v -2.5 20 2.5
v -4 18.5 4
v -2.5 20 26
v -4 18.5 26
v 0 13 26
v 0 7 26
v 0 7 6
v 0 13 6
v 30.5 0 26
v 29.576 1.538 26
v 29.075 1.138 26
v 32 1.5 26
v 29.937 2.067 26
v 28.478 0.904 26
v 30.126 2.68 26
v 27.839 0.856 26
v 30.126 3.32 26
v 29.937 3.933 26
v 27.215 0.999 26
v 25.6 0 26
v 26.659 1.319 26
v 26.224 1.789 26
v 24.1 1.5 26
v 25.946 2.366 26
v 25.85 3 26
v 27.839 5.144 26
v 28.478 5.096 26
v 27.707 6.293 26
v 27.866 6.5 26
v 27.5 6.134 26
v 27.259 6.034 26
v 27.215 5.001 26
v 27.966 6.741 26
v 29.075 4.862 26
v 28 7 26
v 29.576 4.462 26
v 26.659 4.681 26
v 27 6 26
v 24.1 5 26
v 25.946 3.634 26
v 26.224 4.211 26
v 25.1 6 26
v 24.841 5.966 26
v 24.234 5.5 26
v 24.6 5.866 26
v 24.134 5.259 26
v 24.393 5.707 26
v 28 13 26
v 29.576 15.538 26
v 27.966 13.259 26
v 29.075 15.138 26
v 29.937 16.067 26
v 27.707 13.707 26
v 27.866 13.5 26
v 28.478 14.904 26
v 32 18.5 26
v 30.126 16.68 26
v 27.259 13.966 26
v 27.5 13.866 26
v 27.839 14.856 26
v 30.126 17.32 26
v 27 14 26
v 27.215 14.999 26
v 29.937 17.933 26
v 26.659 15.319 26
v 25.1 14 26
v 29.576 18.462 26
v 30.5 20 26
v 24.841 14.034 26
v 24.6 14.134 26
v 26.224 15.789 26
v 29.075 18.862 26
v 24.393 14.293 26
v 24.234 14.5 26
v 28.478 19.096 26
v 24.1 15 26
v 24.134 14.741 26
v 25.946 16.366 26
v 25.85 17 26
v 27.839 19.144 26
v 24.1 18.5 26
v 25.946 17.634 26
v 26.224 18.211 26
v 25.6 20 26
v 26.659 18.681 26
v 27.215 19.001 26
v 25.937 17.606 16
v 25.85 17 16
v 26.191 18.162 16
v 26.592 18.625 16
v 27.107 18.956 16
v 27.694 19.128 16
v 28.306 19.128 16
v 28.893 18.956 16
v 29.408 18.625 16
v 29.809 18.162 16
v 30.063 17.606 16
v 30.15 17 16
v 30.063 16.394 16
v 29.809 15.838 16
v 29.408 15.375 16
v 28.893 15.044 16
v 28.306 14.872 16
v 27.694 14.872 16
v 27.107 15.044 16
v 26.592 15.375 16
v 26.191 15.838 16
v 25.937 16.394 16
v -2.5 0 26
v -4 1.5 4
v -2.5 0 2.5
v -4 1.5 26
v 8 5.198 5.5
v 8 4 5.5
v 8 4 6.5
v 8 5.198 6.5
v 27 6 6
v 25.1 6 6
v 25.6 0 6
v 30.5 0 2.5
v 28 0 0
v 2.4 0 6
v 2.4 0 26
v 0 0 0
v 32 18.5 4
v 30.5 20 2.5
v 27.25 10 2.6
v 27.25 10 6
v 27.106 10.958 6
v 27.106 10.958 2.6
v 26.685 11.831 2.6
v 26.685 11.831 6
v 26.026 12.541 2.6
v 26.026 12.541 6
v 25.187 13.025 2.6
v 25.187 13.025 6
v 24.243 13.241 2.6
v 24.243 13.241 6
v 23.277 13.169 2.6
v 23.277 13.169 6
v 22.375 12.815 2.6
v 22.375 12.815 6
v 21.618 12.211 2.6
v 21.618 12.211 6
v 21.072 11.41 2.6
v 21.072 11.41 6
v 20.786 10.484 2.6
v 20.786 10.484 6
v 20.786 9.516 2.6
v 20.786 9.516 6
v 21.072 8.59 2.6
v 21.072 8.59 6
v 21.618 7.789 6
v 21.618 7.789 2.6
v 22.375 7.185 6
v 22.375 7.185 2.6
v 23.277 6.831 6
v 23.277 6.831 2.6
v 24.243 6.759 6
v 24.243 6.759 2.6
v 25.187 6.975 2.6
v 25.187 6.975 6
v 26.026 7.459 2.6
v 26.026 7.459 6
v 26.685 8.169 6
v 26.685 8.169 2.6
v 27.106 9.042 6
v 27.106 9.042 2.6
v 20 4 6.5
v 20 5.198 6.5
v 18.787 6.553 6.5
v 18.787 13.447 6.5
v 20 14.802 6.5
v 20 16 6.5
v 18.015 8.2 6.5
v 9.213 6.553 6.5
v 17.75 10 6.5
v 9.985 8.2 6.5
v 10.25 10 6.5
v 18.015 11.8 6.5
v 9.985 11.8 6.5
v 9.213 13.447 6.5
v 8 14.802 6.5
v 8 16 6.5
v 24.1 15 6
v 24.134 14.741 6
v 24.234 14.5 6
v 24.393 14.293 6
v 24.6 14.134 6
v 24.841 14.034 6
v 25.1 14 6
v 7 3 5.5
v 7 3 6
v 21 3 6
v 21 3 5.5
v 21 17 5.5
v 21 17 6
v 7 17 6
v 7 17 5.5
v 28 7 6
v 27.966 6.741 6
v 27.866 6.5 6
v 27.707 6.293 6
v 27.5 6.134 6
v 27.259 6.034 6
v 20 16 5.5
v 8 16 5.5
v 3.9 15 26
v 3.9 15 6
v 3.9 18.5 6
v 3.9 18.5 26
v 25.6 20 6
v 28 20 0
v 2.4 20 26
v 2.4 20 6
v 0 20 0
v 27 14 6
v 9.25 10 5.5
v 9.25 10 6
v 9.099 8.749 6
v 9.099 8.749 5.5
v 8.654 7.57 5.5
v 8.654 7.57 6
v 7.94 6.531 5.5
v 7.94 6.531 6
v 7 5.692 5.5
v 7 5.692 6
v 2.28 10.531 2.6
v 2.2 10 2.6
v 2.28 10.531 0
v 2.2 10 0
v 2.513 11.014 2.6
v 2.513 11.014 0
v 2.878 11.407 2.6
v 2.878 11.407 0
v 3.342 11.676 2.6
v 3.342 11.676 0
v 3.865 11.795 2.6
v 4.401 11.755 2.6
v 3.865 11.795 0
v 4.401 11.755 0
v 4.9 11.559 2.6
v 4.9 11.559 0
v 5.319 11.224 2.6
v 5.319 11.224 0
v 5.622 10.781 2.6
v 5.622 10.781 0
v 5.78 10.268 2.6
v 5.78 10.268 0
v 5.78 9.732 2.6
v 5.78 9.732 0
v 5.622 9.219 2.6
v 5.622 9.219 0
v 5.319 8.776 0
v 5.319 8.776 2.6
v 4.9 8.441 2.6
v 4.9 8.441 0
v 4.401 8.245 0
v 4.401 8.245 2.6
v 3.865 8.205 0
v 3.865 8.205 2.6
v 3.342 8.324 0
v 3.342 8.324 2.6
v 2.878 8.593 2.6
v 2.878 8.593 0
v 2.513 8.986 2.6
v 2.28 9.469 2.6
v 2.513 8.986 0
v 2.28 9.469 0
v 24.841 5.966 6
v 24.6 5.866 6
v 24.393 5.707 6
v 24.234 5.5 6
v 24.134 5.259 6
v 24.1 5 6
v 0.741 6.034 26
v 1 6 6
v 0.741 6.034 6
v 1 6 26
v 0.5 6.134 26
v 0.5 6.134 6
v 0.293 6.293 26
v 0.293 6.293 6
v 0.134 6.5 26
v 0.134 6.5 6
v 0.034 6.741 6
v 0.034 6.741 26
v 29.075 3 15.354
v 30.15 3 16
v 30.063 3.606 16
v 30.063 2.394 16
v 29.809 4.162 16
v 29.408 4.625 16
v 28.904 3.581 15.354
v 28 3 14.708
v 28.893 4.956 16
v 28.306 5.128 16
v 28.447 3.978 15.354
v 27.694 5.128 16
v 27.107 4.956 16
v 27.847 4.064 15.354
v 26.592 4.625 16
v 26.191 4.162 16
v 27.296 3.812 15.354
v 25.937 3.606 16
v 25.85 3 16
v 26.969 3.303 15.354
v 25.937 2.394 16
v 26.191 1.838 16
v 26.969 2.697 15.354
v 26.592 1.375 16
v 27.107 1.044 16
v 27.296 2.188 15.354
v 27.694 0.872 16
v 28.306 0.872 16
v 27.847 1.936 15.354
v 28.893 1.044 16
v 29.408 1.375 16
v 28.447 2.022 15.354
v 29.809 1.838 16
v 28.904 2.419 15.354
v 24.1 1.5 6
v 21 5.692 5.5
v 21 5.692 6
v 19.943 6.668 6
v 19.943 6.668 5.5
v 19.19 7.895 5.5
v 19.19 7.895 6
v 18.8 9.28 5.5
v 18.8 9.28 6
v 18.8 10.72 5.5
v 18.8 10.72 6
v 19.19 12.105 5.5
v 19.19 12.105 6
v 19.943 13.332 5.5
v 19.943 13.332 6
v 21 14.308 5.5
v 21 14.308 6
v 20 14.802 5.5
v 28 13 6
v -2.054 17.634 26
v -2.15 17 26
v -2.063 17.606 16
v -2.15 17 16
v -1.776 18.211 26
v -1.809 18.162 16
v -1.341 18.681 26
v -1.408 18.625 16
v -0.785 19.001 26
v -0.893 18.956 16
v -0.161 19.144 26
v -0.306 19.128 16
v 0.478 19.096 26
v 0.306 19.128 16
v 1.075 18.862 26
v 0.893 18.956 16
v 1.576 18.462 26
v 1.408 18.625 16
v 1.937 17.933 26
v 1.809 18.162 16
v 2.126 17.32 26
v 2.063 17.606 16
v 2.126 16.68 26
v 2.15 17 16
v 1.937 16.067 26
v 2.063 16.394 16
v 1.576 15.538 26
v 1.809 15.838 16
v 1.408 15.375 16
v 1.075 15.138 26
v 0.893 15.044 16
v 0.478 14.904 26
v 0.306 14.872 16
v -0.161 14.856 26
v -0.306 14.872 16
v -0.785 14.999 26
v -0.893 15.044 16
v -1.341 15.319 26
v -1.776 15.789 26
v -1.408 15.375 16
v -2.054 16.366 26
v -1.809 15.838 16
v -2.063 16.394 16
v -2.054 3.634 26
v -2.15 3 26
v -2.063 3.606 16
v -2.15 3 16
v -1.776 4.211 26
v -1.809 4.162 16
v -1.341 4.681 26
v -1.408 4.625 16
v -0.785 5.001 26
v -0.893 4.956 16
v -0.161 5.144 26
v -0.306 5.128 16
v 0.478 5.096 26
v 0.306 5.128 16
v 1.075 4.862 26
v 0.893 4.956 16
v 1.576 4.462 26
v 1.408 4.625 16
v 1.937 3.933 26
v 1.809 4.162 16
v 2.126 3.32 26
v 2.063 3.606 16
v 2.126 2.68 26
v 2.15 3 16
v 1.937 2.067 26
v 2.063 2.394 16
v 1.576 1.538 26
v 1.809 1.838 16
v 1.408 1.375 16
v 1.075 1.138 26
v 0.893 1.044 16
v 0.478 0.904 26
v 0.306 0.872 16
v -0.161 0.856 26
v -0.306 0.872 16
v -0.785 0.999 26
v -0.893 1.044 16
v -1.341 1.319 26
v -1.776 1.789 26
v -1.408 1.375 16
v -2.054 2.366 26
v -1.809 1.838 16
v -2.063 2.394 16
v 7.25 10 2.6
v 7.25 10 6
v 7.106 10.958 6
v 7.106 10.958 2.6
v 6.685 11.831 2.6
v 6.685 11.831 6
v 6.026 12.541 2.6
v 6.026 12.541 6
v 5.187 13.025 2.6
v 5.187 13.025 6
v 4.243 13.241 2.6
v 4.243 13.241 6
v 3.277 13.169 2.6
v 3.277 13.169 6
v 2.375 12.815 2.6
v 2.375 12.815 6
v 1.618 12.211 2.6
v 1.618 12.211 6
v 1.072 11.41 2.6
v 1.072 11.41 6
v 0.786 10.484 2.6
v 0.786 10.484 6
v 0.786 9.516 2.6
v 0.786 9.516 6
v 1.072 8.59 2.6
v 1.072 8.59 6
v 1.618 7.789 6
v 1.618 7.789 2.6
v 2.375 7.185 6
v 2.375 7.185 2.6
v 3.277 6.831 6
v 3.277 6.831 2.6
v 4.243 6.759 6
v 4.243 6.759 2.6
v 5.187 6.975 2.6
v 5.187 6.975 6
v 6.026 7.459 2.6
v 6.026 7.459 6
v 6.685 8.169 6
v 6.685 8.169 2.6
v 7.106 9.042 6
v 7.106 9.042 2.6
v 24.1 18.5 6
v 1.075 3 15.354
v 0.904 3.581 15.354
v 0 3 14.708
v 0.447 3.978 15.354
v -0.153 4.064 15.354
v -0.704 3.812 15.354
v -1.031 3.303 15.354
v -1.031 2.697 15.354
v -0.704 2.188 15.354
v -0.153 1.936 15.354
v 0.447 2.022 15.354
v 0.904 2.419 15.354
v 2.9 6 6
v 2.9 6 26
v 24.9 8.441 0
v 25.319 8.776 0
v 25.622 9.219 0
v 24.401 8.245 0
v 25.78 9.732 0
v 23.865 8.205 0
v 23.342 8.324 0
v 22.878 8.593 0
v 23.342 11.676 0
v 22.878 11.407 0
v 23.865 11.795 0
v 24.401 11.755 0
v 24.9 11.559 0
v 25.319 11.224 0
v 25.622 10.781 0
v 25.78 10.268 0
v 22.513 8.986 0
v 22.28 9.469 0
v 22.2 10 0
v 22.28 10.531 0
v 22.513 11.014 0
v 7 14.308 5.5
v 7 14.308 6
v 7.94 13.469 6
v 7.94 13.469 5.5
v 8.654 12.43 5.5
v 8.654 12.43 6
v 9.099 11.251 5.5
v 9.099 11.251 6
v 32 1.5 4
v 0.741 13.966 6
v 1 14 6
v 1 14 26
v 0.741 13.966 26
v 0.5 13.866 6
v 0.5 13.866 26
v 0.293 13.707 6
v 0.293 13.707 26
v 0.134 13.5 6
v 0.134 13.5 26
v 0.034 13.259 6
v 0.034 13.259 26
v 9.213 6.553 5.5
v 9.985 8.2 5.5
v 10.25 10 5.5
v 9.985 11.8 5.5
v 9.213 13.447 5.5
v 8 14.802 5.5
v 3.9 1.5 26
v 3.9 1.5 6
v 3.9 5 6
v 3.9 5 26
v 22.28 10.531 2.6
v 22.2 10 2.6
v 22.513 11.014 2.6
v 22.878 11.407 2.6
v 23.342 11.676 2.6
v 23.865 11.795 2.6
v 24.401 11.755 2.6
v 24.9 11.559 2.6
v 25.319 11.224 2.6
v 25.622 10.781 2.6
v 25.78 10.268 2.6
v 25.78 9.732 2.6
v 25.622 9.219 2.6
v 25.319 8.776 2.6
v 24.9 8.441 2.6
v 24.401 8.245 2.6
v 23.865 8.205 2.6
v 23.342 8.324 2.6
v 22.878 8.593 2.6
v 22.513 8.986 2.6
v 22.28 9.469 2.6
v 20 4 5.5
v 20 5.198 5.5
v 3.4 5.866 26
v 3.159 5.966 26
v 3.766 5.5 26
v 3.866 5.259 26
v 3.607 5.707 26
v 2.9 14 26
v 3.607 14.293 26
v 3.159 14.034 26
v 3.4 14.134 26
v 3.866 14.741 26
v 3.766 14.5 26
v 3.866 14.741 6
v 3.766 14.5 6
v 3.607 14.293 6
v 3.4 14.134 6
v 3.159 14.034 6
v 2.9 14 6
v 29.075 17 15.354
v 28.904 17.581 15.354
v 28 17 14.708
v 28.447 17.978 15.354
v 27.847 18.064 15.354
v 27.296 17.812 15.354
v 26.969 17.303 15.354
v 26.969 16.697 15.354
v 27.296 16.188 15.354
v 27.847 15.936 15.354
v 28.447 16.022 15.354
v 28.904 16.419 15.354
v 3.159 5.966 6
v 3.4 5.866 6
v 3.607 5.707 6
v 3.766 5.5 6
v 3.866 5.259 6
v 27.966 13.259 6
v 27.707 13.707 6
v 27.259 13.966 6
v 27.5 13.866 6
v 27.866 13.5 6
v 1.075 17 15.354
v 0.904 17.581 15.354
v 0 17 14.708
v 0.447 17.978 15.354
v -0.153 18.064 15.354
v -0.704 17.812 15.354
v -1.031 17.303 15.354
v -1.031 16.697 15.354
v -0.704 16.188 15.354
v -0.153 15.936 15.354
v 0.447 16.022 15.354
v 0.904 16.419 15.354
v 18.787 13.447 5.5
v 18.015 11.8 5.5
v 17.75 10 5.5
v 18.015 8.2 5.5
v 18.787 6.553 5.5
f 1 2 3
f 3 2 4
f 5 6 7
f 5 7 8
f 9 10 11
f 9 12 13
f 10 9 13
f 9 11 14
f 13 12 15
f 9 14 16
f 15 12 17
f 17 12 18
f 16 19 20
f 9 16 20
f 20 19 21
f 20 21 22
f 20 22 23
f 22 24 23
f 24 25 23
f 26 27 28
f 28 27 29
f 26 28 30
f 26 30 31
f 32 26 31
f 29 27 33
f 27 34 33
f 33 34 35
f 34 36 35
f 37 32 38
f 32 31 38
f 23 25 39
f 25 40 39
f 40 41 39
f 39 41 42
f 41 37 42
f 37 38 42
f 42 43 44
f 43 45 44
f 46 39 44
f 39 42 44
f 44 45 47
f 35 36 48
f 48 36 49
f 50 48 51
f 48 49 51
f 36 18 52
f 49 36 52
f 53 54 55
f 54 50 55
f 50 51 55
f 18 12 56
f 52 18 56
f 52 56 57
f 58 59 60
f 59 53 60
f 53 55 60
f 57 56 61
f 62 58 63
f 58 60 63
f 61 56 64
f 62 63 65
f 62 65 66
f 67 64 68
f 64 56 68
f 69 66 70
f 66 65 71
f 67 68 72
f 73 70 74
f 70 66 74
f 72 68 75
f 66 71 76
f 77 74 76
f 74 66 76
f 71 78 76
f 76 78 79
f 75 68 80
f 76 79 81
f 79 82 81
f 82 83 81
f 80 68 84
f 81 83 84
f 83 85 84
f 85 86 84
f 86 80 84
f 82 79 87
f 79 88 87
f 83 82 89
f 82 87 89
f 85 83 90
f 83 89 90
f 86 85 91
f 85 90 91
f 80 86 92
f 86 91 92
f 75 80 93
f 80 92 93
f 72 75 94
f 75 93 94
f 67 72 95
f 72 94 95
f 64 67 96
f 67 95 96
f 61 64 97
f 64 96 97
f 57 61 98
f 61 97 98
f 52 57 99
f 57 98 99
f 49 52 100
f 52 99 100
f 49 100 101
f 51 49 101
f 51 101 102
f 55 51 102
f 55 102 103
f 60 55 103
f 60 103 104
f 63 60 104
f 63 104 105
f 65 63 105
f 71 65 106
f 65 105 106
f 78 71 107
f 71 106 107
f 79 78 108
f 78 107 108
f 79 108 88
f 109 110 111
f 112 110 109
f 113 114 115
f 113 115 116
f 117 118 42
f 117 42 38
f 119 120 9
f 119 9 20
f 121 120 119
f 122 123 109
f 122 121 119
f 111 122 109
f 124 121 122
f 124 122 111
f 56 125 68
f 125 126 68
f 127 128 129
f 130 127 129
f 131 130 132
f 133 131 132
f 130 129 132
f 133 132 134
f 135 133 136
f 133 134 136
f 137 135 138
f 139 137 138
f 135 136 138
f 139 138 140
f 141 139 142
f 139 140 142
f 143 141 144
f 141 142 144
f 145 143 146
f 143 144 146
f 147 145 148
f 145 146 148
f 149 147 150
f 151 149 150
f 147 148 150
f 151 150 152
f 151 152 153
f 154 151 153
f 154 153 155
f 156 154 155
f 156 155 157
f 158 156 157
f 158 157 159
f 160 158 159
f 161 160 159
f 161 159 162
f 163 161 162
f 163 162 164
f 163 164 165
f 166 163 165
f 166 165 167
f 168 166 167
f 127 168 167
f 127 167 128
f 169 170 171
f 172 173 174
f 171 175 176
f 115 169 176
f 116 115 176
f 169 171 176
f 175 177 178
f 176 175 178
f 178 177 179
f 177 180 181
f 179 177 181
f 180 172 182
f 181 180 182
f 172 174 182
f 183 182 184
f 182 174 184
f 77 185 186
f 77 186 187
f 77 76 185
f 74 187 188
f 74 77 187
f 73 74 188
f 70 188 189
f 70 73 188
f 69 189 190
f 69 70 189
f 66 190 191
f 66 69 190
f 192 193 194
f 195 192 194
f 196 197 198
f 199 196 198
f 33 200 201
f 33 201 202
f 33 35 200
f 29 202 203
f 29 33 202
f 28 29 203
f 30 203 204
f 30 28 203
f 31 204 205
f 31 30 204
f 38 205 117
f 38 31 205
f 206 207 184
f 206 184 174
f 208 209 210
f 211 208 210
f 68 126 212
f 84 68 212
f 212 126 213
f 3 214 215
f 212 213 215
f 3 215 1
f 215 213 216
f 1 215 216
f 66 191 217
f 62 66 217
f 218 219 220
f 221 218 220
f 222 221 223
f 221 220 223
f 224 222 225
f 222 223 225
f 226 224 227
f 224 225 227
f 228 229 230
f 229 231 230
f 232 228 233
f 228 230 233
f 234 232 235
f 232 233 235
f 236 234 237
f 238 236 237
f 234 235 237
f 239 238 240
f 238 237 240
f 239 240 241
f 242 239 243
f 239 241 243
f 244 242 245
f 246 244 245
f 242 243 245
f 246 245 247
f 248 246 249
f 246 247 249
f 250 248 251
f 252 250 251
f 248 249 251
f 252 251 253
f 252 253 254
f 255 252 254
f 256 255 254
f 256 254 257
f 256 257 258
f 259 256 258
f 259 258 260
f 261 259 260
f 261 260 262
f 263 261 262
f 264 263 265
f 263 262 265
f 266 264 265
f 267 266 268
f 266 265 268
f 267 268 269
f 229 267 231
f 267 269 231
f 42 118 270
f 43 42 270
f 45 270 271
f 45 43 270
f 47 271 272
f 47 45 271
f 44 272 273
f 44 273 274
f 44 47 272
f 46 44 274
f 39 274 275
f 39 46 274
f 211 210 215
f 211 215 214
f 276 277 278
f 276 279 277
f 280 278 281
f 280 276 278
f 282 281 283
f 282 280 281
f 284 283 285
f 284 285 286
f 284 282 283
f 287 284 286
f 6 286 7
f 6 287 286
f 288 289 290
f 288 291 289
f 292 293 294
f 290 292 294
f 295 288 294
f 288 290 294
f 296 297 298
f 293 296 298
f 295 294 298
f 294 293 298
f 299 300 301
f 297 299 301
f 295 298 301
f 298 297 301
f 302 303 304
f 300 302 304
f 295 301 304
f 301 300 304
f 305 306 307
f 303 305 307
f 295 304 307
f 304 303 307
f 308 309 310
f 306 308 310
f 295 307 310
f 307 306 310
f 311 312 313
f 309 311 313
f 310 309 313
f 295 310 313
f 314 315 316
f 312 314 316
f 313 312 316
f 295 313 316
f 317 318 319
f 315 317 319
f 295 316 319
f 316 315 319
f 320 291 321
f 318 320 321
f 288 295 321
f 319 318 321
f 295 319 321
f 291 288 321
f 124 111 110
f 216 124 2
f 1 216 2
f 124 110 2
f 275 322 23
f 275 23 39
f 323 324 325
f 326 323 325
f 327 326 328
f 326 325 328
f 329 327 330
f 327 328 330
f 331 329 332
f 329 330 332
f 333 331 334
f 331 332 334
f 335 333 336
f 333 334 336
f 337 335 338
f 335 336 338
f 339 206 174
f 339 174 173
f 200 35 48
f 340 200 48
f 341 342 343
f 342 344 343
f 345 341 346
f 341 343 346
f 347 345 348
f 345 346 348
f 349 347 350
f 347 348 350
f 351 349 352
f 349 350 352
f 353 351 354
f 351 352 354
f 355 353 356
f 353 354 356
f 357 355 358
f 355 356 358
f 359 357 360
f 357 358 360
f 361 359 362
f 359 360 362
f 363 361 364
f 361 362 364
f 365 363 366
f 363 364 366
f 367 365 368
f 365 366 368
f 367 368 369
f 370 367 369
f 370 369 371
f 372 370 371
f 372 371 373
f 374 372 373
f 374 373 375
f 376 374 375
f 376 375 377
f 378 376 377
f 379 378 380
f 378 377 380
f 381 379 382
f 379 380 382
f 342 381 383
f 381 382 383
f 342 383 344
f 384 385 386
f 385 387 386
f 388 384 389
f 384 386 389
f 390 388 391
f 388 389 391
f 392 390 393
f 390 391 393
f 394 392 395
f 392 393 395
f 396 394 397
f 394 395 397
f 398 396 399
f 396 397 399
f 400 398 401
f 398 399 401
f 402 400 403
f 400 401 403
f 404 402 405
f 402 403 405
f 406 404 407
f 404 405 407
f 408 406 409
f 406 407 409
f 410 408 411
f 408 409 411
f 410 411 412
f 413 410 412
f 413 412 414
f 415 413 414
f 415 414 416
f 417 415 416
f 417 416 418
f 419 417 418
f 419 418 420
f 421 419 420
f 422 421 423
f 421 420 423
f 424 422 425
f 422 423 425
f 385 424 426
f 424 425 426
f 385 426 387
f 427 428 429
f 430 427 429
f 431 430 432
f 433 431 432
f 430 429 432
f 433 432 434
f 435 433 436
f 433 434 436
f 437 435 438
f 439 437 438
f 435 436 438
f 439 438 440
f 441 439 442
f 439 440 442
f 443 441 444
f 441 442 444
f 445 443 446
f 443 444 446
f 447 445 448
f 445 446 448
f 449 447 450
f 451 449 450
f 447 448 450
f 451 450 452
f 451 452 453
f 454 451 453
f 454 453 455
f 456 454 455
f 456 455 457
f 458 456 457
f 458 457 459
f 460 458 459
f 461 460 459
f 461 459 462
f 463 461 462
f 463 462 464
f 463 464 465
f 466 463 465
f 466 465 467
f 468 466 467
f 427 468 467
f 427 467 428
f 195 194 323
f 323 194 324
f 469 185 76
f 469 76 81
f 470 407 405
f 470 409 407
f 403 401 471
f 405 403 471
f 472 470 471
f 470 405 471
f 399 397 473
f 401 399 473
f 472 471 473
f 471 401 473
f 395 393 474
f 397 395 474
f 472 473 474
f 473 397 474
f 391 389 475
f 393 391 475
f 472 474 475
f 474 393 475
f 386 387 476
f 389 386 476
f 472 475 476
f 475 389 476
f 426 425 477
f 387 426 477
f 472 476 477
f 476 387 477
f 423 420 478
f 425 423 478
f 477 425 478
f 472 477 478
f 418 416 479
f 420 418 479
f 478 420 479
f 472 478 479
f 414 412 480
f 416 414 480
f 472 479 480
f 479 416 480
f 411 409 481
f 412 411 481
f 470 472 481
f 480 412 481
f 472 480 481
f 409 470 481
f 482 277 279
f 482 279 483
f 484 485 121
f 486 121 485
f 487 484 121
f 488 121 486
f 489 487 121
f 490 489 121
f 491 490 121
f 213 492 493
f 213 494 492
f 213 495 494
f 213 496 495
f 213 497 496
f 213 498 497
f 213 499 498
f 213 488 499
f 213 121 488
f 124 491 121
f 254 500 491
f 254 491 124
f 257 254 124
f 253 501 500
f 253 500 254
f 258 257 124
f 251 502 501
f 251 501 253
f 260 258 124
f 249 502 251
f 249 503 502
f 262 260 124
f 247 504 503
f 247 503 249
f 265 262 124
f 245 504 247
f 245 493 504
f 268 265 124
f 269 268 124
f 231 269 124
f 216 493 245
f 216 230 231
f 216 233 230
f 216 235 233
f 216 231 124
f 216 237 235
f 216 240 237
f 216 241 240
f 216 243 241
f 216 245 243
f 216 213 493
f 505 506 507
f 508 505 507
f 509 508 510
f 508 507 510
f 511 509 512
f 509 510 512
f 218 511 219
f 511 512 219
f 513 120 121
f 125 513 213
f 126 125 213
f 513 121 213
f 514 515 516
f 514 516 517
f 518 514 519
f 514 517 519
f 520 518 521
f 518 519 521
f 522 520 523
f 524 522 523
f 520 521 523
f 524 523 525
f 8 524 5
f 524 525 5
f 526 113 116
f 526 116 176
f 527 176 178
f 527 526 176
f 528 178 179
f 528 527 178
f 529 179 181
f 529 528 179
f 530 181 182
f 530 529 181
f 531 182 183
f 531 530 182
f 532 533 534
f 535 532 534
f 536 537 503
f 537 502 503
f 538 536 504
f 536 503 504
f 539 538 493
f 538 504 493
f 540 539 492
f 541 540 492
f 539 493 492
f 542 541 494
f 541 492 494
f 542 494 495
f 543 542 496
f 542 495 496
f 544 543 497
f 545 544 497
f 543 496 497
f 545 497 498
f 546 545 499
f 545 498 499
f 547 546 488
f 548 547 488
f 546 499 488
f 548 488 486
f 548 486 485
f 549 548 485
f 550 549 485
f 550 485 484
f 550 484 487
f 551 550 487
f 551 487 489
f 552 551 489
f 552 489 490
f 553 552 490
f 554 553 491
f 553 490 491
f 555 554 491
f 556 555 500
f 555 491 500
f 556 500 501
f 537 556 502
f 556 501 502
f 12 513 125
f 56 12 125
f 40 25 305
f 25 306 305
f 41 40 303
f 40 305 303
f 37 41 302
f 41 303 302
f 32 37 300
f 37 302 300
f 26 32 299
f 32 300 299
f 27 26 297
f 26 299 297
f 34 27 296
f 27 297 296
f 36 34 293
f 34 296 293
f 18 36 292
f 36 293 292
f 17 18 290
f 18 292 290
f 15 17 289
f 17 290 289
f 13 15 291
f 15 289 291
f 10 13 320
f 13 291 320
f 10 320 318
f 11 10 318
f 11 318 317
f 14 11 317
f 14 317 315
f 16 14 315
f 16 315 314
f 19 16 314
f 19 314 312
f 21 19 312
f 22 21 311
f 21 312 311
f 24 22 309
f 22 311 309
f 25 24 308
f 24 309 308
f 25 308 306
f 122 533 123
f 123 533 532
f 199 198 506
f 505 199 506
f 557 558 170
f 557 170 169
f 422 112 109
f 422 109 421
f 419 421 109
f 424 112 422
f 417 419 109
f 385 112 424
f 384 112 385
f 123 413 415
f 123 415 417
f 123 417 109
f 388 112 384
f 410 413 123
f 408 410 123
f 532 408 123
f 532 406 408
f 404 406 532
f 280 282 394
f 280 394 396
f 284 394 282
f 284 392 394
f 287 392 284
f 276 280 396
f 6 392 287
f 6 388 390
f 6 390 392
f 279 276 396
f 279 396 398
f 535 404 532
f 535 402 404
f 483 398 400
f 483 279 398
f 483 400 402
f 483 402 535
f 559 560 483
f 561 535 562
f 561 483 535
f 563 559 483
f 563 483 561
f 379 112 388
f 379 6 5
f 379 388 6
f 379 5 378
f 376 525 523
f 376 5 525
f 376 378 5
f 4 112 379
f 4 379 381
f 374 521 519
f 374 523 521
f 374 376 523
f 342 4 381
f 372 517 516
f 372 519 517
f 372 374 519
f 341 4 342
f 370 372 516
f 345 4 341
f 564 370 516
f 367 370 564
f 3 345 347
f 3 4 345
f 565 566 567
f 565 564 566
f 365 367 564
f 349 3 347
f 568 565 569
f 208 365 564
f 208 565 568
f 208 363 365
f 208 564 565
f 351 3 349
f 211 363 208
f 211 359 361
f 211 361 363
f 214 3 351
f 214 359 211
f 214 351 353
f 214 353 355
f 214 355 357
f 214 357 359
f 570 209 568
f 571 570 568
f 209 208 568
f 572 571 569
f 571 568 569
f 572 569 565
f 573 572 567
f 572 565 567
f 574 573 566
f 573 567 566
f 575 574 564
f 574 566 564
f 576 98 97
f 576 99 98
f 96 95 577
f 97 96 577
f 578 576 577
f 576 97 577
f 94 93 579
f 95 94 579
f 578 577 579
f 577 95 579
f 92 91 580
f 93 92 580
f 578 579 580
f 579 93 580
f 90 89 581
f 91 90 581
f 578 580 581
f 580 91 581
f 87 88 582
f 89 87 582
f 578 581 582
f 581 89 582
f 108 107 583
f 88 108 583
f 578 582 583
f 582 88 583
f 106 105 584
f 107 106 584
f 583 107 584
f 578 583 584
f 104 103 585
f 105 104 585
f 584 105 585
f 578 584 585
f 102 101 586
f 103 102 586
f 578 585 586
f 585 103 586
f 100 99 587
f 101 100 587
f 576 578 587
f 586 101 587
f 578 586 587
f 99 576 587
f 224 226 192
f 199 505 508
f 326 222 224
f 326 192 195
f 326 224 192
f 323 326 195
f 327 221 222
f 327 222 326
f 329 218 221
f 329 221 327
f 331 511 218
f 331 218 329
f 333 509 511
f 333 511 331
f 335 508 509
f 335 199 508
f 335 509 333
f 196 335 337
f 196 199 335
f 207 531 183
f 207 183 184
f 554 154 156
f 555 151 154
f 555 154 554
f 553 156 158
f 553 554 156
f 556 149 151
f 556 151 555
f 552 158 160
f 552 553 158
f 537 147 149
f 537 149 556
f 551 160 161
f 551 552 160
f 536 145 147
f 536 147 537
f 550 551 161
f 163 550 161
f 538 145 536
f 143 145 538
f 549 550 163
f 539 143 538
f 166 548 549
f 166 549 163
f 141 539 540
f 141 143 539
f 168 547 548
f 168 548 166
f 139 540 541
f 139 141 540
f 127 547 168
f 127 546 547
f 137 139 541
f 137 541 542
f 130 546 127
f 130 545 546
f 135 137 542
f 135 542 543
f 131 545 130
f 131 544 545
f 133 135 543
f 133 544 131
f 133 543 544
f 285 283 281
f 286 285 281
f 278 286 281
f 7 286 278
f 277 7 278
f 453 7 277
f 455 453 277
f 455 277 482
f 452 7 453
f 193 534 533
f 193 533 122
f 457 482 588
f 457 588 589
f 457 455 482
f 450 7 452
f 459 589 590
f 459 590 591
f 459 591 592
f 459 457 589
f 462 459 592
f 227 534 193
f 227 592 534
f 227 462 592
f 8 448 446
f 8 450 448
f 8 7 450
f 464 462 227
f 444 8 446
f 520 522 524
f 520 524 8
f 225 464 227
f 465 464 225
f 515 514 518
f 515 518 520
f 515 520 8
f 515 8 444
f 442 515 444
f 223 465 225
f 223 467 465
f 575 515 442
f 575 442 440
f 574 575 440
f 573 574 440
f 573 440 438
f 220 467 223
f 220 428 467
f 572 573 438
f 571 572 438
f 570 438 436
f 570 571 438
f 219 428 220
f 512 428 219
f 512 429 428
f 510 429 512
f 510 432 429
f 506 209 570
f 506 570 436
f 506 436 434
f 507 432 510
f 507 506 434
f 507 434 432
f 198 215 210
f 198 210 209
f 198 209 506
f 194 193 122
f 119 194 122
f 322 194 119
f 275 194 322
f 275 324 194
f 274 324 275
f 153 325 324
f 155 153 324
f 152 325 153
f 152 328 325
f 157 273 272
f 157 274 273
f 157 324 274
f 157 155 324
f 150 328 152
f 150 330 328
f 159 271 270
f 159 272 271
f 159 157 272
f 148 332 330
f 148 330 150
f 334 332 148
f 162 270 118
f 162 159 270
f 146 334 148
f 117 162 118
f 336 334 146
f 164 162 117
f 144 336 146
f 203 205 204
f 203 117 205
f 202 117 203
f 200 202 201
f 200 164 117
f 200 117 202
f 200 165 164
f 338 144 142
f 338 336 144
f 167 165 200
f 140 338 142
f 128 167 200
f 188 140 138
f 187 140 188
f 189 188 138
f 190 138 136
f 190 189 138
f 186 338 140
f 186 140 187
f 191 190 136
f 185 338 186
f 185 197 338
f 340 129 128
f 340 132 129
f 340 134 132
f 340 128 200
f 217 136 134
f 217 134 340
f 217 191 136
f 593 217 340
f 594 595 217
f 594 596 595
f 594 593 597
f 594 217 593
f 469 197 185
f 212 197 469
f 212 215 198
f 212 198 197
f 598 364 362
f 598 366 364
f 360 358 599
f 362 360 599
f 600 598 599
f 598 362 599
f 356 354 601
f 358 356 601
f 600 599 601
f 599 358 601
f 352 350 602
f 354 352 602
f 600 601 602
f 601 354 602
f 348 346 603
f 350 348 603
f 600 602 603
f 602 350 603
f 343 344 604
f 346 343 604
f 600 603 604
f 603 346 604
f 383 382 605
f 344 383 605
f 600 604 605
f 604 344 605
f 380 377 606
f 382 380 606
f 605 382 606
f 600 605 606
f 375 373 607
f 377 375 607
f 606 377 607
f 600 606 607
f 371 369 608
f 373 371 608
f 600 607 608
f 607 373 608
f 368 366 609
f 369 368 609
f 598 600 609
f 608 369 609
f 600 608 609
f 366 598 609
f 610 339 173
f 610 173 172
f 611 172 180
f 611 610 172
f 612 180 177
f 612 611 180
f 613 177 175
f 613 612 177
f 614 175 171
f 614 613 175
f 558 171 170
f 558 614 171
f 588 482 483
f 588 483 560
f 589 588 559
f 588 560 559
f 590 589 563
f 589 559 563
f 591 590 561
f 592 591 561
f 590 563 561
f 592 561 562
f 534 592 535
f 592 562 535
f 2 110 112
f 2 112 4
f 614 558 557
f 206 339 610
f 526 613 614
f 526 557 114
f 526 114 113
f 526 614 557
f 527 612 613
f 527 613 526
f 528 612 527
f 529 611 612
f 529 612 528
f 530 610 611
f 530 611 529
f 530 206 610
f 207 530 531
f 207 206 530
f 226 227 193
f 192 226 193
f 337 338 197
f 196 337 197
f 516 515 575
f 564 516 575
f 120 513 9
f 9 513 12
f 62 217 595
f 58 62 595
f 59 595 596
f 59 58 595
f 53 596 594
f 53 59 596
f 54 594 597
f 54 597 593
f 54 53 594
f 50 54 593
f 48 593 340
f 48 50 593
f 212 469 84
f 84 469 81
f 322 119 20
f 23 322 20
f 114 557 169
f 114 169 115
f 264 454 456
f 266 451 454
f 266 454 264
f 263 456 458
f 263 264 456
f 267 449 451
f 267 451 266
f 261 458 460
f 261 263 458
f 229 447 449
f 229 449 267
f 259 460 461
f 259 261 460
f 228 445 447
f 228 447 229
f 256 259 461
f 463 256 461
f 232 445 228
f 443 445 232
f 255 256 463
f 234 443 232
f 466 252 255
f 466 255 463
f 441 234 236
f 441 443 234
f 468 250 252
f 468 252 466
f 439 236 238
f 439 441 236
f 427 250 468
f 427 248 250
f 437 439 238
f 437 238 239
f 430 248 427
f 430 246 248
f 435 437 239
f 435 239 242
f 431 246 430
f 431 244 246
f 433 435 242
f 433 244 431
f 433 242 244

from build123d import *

# Parameters (mm, degrees)
SKETCH1_W                                           = 28
SKETCH1_H                                           = 20
BOSS_EXTRUDE1_DEPTH                                 = 6
CBORE_FOR_M3_HEX_SOCKET_HEAD_CAP_SCREW1_D           = 3.6
CBORE_FOR_M3_HEX_SOCKET_HEAD_CAP_SCREW1_CBORE_D     = 6.5
CBORE_FOR_M3_HEX_SOCKET_HEAD_CAP_SCREW1_CBORE_DEPTH = 3.4
SKETCH5_W                                           = 3.9
SKETCH5_H                                           = 6
BOSS_EXTRUDE2_DEPTH                                 = 20
SKETCH6_W                                           = 4
SKETCH6_H                                           = 20
BOSS_EXTRUDE3_DEPTH                                 = 26
FILLET1_R                                           = 1
F_4_3_4_3_DIAMETER_HOLE1_D                          = 4.3
F_4_3_4_3_DIAMETER_HOLE1_DEPTH                      = 10
F_4_3_4_3_DIAMETER_HOLE1_TIP                        = 1.291850331
CHAMFER1_SIZE                                       = 1.5
CUT_EXTRUDE1_DEPTH                                  = 0.5
BOSS_EXTRUDE4_DEPTH                                 = 1
CHAMFER3_SIZE                                       = 4


with BuildPart() as part:
    # Sketch1 → Boss-Extrude1 (new body)
    with BuildSketch(Plane.XY):
        with Locations((14, 10)):
            Rectangle(SKETCH1_W, SKETCH1_H)
    extrude(amount=BOSS_EXTRUDE1_DEPTH)

    # CBORE for M3 Hex Socket Head Cap Screw1 (through all)
    with Locations(Plane.XY.offset(6)):
        with Locations((4, 10), (24, 10)):
            CounterBoreHole(CBORE_FOR_M3_HEX_SOCKET_HEAD_CAP_SCREW1_D / 2, CBORE_FOR_M3_HEX_SOCKET_HEAD_CAP_SCREW1_CBORE_D / 2, CBORE_FOR_M3_HEX_SOCKET_HEAD_CAP_SCREW1_CBORE_DEPTH)

    # Sketch5 → Boss-Extrude2 (add)
    with BuildSketch(Plane.XY.offset(6)):
        with Locations((26.05, 17)):
            Rectangle(SKETCH5_W, SKETCH5_H)
        with Locations((1.95, 17)):
            Rectangle(SKETCH5_W, SKETCH5_H)
        with Locations((26.05, 3)):
            Rectangle(SKETCH5_W, SKETCH5_H)
        with Locations((1.95, 3)):
            Rectangle(SKETCH5_W, SKETCH5_H)
    extrude(amount=BOSS_EXTRUDE2_DEPTH)

    # Sketch6 → Boss-Extrude3 (add)
    with BuildSketch(Plane(origin=(0, 0, 0), x_dir=(-1, 0, 0), z_dir=(0, 0, -1))):
        with Locations((-30, 10)):
            Rectangle(SKETCH6_W, SKETCH6_H)
        with Locations((2, 10)):
            Rectangle(SKETCH6_W, SKETCH6_H)
    extrude(amount=-BOSS_EXTRUDE3_DEPTH)

    # Fillet1
    fillet1_edges = [part.edges().sort_by_distance(p)[0] for p in [
        (0, 14, 16),
        (3.9, 14, 16),
        (24.1, 14, 16),
        (28, 14, 16),
        (28, 6, 16),
        (24.1, 6, 16),
        (3.9, 6, 16),
        (0, 6, 16),
    ]]
    fillet(fillet1_edges, radius=FILLET1_R)

    # Ø4.3 (4.3) Diameter Hole1
    with Locations(Plane.XY.offset(26)):
        with Locations((28, 17), (0, 17), (0, 3), (28, 3)):
            Hole(F_4_3_4_3_DIAMETER_HOLE1_D / 2, depth=F_4_3_4_3_DIAMETER_HOLE1_DEPTH)
            with Locations((0, 0, -(F_4_3_4_3_DIAMETER_HOLE1_DEPTH + F_4_3_4_3_DIAMETER_HOLE1_TIP / 2))):  # 118° drill point
                Cone(0, F_4_3_4_3_DIAMETER_HOLE1_D / 2, F_4_3_4_3_DIAMETER_HOLE1_TIP, mode=Mode.SUBTRACT)

    # Chamfer1
    chamfer1_edges = [part.edges().sort_by_distance(p)[0] for p in [
        (3.9, 20, 16),
        (24.1, 20, 16),
        (24.1, 0, 16),
        (3.9, 0, 16),
        (32, 0, 13),
        (32, 20, 13),
        (-4, 20, 13),
        (-4, 0, 13),
    ]]
    chamfer(chamfer1_edges, length=CHAMFER1_SIZE)

    # Sketch9 → Cut-Extrude1 (cut)
    with BuildSketch(Plane.XY.offset(6)):
        with BuildLine():
            Line((21, 17), (7, 17))
            Line((7, 17), (7, 14.308421985))
            ThreePointArc((7, 14.308421985), (8.653627617, 12.430277762), (9.25, 10))
            ThreePointArc((9.25, 10), (8.653627617, 7.569722238), (7, 5.691578015))
            Line((7, 5.691578015), (7, 3))
            Line((7, 3), (21, 3))
            Line((21, 3), (21, 5.691578015))
            ThreePointArc((21, 5.691578015), (18.75, 10), (21, 14.308421985))
            Line((21, 14.308421985), (21, 17))
        make_face()
    extrude(amount=-CUT_EXTRUDE1_DEPTH, mode=Mode.SUBTRACT)

    # Chamfer3
    chamfer3_edges = [part.edges().sort_by_distance(p)[0] for p in [
        (-4, 10, 0),
        (32, 10, 0),
    ]]
    chamfer(chamfer3_edges, length=CHAMFER3_SIZE)


with BuildPart() as body_2:
    # Sketch10 → Boss-Extrude4 (new body)
    with BuildSketch(Plane.XY.offset(5.5)):
        with BuildLine():
            ThreePointArc((8, 5.197656822), (10.25, 10), (8, 14.802343178))
            Line((8, 14.802343178), (8, 16))
            Line((8, 16), (20, 16))
            Line((20, 16), (20, 14.802343178))
            ThreePointArc((20, 14.802343178), (17.75, 10), (20, 5.197656822))
            Line((20, 5.197656822), (20, 4))
            Line((20, 4), (8, 4))
            Line((8, 4), (8, 5.197656822))
        make_face()
    extrude(amount=BOSS_EXTRUDE4_DEPTH)


solid = Compound([part.part, body_2.part])
